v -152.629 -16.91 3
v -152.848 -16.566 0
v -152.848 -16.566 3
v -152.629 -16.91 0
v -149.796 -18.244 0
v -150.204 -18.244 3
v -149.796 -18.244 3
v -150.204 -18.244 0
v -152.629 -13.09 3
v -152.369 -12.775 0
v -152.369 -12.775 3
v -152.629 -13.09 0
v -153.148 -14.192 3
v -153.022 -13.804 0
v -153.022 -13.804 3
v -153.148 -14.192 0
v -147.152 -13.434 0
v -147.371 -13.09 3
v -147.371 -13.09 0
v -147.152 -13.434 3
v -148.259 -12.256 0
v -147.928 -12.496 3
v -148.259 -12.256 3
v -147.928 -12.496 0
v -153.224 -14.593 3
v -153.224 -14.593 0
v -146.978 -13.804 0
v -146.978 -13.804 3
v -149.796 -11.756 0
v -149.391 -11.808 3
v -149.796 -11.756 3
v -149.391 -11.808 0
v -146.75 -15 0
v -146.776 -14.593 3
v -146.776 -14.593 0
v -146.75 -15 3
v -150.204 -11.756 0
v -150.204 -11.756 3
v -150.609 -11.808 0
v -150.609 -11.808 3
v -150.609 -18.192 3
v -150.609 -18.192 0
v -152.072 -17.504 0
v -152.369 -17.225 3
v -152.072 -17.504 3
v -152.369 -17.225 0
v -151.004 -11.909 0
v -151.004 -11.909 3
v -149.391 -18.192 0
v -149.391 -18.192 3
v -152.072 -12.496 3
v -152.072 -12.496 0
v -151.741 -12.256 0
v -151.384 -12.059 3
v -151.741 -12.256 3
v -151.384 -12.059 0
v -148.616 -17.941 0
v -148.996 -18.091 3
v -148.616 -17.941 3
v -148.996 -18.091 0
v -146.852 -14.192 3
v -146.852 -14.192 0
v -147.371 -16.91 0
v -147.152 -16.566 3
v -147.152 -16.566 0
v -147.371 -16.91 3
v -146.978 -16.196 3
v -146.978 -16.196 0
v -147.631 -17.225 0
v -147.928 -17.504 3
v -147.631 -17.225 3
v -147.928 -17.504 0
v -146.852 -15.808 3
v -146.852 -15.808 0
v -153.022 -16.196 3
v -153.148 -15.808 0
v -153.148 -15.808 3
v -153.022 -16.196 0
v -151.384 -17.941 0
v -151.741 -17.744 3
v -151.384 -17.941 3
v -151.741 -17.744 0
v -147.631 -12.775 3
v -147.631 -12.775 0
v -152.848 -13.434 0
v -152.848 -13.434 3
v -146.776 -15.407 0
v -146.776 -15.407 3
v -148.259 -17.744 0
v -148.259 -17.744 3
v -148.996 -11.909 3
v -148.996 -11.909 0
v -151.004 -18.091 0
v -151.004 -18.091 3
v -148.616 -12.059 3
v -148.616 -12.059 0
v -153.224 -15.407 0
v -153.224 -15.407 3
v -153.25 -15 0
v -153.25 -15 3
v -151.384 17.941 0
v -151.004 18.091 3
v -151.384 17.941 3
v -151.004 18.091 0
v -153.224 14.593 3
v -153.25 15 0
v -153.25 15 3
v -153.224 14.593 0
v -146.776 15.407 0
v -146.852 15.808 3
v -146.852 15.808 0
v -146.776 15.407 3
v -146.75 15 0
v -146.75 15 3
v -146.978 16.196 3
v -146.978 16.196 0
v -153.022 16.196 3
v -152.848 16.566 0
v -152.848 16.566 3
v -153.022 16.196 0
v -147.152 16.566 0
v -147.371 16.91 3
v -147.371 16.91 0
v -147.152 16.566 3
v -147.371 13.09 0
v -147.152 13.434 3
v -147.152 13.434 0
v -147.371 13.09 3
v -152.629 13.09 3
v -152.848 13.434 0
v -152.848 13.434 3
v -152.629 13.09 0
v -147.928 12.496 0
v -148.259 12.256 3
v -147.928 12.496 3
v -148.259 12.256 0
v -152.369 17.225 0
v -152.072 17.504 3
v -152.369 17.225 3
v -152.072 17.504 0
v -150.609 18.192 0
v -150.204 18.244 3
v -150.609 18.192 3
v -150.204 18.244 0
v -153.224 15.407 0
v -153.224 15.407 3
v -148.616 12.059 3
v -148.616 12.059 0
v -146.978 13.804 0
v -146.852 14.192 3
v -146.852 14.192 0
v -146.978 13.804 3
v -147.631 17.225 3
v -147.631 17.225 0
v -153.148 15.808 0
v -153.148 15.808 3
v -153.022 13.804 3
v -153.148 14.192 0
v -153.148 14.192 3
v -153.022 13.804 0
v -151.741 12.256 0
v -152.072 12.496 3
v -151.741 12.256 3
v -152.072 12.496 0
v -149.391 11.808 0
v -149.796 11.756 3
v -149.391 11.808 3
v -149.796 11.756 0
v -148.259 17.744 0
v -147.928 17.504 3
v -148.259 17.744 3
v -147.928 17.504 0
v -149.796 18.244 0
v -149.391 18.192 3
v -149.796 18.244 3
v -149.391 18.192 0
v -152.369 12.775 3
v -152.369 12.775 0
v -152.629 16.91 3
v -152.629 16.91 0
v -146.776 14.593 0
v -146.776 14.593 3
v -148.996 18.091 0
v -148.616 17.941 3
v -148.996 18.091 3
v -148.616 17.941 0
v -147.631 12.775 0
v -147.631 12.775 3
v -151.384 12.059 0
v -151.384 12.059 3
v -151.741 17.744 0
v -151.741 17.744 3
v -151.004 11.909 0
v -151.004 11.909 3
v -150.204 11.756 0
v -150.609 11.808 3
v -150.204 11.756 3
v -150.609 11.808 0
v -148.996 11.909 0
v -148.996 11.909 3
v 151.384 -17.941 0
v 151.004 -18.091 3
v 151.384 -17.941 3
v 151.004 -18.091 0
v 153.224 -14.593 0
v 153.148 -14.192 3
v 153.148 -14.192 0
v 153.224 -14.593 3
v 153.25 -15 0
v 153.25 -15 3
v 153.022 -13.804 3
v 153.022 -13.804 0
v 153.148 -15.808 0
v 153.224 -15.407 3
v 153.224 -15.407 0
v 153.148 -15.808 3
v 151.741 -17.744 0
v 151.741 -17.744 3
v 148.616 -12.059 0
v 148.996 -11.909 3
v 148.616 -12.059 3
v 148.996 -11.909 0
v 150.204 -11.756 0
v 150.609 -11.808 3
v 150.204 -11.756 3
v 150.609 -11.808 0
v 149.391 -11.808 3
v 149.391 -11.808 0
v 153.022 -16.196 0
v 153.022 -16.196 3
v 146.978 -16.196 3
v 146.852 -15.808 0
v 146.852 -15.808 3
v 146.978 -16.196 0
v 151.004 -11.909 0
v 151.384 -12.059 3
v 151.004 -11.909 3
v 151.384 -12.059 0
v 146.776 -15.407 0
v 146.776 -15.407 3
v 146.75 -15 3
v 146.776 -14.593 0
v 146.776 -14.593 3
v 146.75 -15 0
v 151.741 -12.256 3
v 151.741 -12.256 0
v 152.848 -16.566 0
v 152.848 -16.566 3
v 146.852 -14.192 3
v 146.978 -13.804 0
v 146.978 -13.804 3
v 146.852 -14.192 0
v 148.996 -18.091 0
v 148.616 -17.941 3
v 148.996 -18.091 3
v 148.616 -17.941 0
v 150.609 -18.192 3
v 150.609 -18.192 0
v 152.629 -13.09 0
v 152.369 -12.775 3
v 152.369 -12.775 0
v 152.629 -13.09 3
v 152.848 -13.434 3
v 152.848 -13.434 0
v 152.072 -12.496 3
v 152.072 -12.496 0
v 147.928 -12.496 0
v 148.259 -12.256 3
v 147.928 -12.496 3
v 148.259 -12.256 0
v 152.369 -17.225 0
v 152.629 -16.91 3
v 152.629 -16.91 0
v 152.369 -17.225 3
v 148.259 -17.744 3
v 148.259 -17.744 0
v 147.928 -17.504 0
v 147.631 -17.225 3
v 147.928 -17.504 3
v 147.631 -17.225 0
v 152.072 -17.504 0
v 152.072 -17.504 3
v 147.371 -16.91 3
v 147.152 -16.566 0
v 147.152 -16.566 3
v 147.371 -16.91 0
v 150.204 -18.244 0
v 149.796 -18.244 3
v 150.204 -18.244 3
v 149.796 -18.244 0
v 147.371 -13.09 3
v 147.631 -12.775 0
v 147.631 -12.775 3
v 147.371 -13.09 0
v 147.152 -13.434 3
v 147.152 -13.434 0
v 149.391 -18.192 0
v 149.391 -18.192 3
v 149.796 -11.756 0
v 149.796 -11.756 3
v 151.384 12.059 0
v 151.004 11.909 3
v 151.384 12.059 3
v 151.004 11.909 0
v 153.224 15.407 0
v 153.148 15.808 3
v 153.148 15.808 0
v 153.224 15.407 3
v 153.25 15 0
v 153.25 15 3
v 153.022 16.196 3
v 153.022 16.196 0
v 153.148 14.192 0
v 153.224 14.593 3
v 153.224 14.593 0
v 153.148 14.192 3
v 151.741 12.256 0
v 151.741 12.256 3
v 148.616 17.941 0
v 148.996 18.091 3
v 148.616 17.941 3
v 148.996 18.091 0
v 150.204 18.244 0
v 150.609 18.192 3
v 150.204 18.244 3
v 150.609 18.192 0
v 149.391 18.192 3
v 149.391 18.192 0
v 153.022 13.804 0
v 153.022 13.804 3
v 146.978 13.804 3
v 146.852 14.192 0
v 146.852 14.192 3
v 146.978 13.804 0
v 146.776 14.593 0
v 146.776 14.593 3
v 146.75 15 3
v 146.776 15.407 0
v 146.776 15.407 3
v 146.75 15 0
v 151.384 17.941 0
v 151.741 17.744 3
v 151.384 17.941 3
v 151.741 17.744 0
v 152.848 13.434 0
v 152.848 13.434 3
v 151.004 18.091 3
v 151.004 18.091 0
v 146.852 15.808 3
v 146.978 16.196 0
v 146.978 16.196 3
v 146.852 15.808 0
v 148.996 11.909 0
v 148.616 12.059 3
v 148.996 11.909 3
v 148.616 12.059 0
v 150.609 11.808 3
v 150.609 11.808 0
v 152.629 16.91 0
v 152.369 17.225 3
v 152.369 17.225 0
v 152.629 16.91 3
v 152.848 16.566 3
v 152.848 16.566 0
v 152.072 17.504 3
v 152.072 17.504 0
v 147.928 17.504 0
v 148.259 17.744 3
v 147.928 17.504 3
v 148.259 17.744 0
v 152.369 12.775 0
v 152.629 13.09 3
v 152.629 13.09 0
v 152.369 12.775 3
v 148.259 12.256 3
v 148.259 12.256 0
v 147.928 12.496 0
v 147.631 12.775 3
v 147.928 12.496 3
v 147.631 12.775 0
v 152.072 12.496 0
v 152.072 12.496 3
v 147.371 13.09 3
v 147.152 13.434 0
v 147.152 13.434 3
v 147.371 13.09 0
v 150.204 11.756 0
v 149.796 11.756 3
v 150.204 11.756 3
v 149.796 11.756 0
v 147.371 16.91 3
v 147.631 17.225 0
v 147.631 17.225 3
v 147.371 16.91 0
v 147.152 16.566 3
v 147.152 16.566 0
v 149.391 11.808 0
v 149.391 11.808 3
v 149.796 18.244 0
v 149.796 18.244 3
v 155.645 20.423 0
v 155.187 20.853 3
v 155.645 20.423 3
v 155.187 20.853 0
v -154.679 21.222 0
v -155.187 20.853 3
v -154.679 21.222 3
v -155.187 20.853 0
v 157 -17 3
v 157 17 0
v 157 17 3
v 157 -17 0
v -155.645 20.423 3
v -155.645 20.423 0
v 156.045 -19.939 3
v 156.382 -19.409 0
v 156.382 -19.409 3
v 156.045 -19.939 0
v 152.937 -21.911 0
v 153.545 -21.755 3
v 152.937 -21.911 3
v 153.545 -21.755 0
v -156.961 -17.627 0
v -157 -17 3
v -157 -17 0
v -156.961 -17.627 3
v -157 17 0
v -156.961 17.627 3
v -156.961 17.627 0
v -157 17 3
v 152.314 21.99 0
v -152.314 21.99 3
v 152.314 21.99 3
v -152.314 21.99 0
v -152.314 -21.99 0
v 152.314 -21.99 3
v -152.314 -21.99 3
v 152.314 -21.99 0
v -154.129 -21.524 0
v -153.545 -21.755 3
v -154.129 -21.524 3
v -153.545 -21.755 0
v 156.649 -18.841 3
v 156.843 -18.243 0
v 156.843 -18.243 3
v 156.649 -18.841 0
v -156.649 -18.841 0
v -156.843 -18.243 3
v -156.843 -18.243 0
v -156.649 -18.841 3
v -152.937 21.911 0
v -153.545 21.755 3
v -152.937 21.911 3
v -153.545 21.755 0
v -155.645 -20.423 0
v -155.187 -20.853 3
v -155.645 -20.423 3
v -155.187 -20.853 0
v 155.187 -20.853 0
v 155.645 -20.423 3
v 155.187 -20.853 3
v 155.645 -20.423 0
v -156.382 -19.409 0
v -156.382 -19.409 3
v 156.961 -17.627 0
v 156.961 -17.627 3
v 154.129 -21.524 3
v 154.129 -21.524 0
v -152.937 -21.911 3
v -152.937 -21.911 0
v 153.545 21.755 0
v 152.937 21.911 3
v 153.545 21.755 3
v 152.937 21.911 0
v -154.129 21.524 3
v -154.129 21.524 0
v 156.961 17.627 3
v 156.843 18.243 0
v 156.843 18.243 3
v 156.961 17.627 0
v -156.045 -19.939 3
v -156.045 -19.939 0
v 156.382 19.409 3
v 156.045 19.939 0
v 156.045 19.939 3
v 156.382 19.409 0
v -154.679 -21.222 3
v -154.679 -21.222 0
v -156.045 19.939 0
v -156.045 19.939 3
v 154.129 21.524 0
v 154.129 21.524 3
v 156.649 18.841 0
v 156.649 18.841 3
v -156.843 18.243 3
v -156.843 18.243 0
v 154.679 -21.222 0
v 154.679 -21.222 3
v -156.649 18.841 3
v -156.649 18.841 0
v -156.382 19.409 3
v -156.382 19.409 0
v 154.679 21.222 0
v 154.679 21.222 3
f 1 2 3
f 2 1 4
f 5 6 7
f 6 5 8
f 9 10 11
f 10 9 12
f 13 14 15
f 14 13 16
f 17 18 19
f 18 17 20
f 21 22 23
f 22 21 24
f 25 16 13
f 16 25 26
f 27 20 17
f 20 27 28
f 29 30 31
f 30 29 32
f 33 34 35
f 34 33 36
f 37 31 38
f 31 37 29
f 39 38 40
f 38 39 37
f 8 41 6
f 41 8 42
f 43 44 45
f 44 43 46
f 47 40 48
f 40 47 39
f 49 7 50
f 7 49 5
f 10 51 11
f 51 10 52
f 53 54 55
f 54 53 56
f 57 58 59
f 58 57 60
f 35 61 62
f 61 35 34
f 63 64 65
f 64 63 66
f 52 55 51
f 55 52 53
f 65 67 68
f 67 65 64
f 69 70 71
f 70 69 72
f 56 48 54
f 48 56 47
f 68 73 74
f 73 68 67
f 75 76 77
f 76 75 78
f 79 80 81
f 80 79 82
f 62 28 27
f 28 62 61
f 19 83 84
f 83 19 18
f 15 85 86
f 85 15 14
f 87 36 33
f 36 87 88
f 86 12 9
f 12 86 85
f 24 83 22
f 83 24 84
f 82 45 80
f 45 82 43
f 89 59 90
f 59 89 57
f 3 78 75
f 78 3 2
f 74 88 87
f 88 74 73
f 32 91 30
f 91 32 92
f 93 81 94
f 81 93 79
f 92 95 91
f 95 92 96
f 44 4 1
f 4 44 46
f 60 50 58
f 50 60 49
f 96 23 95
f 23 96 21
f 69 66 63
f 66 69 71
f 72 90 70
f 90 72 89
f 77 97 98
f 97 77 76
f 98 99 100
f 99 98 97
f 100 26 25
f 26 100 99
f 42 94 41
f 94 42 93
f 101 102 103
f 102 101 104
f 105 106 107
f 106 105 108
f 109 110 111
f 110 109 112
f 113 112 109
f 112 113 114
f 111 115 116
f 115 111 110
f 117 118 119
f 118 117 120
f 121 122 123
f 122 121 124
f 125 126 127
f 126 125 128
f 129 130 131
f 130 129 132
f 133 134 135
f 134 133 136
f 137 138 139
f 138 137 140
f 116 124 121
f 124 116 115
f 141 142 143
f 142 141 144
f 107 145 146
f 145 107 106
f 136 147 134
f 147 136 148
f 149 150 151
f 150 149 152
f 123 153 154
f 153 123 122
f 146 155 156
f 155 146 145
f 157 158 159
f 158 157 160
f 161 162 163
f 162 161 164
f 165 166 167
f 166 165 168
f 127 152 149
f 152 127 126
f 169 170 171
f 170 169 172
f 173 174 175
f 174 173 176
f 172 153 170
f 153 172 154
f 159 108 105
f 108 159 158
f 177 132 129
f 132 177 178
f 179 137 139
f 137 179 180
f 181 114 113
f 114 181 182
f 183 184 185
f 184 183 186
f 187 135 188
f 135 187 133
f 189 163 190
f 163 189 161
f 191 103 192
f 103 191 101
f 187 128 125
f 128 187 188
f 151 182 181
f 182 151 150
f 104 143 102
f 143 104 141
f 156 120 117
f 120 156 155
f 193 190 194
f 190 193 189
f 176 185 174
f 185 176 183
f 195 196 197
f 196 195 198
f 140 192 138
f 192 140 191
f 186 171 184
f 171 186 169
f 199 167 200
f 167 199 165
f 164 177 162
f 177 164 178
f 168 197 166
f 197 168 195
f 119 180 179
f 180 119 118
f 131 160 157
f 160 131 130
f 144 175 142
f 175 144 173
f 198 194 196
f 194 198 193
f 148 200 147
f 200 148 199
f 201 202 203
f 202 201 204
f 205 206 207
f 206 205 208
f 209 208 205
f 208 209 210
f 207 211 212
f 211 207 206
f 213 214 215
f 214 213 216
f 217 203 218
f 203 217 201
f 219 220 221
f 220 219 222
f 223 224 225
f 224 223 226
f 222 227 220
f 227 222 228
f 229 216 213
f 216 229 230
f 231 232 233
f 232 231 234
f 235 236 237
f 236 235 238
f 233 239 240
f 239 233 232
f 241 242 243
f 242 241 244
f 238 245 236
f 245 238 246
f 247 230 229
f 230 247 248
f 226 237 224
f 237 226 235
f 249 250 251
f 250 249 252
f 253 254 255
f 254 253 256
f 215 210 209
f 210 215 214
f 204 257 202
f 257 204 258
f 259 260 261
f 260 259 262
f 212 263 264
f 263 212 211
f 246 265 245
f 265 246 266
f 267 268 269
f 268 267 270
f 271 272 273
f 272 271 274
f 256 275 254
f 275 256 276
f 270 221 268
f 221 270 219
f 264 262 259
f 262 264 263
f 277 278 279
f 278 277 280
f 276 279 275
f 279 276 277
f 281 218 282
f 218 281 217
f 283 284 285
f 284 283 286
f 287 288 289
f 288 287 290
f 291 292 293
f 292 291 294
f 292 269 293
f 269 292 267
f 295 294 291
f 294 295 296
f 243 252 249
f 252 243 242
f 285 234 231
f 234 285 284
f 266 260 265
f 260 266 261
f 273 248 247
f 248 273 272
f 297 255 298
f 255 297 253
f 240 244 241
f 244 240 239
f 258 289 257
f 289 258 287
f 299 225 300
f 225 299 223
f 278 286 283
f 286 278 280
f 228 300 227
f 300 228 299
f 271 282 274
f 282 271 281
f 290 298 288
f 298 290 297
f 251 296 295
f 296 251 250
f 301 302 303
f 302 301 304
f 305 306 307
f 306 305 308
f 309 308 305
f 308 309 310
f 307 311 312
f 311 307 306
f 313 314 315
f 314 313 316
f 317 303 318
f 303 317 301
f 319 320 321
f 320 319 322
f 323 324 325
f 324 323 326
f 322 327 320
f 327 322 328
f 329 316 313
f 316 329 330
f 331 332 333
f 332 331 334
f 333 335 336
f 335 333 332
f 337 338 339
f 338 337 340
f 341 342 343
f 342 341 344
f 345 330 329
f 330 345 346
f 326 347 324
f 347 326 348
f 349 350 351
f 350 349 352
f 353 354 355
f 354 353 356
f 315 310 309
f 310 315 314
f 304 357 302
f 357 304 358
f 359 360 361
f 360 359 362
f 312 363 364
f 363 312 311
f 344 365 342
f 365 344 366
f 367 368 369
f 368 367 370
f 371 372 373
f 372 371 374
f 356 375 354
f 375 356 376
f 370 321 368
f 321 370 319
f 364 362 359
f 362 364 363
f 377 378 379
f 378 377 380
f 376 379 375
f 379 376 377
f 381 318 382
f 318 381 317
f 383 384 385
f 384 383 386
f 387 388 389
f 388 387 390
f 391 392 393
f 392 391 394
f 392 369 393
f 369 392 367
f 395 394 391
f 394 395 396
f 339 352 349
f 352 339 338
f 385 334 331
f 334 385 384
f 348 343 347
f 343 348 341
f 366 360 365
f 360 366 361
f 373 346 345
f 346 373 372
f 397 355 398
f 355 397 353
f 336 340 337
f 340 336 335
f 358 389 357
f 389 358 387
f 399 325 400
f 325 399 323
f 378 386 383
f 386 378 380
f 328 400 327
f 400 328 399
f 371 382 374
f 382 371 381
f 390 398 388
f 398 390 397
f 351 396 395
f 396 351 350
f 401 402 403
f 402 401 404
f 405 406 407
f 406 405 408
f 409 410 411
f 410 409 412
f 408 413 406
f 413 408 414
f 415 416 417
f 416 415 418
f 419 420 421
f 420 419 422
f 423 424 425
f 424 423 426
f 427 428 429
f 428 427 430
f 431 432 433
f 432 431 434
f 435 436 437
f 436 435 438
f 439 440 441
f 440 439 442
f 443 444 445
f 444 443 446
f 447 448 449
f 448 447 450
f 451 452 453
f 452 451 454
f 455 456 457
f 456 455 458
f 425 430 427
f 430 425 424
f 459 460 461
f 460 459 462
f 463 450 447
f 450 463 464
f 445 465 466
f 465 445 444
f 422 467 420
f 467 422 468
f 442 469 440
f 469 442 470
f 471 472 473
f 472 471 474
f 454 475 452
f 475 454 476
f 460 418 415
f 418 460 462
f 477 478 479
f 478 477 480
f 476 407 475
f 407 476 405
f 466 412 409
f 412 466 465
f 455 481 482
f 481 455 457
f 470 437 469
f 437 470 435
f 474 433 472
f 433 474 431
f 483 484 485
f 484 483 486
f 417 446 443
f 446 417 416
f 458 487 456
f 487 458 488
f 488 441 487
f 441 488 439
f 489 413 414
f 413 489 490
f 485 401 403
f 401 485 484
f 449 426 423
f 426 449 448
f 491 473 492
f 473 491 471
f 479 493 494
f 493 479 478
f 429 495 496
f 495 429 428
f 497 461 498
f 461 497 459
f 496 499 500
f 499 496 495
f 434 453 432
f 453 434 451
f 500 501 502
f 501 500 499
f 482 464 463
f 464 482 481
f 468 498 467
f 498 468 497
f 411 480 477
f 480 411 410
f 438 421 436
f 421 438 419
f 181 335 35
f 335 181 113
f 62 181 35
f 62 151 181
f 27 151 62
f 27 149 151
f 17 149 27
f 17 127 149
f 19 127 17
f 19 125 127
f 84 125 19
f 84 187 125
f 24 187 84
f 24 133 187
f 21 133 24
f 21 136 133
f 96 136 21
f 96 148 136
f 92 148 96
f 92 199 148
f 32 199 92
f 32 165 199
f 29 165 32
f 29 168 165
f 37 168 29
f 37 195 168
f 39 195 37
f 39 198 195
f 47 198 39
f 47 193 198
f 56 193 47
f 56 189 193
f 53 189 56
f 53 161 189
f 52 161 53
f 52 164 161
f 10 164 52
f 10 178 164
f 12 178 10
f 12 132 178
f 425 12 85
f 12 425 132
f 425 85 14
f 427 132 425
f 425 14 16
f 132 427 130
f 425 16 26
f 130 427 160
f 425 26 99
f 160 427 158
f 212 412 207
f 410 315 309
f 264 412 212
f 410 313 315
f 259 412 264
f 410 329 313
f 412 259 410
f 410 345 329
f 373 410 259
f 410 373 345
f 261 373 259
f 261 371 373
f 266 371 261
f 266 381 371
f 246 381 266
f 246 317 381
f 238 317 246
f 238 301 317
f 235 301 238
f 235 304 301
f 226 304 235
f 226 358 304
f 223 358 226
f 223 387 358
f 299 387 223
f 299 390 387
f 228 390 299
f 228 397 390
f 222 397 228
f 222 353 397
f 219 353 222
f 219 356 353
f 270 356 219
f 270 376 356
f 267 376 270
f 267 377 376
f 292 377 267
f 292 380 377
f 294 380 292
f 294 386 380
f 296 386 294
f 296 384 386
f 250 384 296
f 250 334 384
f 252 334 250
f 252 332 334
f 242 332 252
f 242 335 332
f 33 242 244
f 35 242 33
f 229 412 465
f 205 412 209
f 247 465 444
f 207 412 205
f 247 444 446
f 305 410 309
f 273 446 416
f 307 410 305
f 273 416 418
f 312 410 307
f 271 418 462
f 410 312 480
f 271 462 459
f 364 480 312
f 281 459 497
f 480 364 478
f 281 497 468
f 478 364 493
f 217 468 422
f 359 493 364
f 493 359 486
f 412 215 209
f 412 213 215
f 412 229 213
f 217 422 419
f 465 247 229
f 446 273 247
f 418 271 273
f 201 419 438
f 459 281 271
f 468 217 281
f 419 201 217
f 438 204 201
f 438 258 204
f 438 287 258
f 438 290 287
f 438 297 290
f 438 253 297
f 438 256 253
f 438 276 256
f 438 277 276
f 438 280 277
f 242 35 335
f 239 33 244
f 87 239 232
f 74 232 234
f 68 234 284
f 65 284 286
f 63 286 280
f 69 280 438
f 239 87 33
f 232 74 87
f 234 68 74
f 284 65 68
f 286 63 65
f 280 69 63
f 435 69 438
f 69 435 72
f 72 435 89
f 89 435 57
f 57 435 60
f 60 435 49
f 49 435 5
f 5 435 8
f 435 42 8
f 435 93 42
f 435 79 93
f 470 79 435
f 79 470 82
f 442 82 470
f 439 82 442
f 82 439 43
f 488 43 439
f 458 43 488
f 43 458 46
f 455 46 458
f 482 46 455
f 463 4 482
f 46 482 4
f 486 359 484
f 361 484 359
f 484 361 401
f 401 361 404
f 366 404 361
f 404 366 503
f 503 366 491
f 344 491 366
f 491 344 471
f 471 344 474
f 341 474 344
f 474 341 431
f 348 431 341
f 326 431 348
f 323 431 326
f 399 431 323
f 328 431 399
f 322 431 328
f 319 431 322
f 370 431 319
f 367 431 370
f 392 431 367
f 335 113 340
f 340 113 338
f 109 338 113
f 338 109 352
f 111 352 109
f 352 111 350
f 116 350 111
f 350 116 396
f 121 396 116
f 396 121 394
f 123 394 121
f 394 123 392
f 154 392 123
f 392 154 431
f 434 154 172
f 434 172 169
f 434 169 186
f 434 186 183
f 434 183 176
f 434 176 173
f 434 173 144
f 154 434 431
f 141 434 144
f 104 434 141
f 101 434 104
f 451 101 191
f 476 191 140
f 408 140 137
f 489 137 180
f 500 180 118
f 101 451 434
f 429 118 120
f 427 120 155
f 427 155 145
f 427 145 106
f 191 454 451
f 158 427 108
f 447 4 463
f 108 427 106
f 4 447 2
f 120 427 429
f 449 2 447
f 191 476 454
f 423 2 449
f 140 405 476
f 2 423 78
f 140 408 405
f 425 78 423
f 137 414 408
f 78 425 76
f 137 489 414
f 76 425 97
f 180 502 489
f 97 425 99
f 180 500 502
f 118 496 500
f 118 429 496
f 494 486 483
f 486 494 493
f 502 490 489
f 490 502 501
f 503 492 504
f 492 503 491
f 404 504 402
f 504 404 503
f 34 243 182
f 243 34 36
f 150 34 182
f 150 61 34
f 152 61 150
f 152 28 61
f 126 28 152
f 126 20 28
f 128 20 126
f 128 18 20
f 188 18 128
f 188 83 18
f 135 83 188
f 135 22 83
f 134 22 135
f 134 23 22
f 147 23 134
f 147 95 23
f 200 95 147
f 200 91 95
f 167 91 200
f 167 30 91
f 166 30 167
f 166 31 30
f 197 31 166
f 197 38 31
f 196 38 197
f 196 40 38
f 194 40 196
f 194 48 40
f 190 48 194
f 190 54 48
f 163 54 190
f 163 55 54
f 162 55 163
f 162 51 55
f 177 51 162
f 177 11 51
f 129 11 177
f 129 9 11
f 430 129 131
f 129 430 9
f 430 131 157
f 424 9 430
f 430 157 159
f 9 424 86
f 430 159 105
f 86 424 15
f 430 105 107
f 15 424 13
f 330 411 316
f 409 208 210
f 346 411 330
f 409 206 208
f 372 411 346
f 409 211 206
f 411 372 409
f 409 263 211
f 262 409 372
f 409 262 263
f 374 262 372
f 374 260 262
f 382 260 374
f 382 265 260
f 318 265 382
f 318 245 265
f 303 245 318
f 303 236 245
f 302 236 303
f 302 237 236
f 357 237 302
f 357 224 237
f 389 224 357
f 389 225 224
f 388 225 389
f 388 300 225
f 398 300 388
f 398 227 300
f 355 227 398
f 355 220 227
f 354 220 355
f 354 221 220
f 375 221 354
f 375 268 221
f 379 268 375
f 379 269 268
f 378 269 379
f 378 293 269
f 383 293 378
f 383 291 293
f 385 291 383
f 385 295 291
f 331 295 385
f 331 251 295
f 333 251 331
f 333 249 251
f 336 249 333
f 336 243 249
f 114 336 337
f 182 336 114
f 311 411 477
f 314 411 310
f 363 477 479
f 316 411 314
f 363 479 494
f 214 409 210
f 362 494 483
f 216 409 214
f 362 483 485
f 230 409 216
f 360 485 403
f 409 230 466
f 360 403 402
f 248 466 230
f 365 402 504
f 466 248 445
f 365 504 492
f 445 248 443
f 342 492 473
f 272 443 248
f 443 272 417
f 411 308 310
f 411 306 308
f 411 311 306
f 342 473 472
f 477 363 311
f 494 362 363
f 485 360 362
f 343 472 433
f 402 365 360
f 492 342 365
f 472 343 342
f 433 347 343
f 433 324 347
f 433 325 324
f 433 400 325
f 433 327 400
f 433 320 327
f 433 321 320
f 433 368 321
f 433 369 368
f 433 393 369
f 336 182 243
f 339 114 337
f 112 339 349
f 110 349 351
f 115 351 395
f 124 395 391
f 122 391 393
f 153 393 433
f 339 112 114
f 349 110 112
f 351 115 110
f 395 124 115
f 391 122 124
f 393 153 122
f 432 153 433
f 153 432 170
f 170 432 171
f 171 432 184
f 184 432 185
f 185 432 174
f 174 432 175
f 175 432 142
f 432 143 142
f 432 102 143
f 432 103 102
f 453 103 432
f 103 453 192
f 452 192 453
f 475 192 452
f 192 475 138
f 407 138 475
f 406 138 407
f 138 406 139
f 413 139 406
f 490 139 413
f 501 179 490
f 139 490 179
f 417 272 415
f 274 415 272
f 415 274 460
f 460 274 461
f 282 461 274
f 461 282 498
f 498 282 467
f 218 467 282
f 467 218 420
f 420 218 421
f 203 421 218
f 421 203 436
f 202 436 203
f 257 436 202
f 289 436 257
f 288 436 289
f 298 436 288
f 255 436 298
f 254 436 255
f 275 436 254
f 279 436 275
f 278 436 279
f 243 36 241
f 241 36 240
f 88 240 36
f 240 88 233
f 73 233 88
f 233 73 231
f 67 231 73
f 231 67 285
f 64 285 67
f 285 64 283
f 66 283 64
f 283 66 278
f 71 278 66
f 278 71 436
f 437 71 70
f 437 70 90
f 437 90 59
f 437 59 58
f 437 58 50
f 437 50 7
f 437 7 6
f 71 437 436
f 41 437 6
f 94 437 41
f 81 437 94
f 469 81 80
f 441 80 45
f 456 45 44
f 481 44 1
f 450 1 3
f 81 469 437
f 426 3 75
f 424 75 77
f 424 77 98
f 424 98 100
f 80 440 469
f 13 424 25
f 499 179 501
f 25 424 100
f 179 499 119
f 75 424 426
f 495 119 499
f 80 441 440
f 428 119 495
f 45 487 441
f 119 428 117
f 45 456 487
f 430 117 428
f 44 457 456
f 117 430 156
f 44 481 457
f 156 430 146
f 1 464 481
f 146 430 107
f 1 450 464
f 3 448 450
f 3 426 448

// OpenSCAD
$fn = 50;


difference() {
	union() {
		hull() {
			translate(v = [-152.0000000000, 17.0000000000, 0]) {
				cylinder(h = 3, r = 5);
			}
			translate(v = [152.0000000000, 17.0000000000, 0]) {
				cylinder(h = 3, r = 5);
			}
			translate(v = [-152.0000000000, -17.0000000000, 0]) {
				cylinder(h = 3, r = 5);
			}
			translate(v = [152.0000000000, -17.0000000000, 0]) {
				cylinder(h = 3, r = 5);
			}
		}
	}
	union() {
		translate(v = [-150.0000000000, -15.0000000000, -100.0000000000]) {
			cylinder(h = 200, r = 3.2500000000);
		}
		translate(v = [-150.0000000000, 15.0000000000, -100.0000000000]) {
			cylinder(h = 200, r = 3.2500000000);
		}
		translate(v = [150.0000000000, -15.0000000000, -100.0000000000]) {
			cylinder(h = 200, r = 3.2500000000);
		}
		translate(v = [150.0000000000, 15.0000000000, -100.0000000000]) {
			cylinder(h = 200, r = 3.2500000000);
		}
	}
}
